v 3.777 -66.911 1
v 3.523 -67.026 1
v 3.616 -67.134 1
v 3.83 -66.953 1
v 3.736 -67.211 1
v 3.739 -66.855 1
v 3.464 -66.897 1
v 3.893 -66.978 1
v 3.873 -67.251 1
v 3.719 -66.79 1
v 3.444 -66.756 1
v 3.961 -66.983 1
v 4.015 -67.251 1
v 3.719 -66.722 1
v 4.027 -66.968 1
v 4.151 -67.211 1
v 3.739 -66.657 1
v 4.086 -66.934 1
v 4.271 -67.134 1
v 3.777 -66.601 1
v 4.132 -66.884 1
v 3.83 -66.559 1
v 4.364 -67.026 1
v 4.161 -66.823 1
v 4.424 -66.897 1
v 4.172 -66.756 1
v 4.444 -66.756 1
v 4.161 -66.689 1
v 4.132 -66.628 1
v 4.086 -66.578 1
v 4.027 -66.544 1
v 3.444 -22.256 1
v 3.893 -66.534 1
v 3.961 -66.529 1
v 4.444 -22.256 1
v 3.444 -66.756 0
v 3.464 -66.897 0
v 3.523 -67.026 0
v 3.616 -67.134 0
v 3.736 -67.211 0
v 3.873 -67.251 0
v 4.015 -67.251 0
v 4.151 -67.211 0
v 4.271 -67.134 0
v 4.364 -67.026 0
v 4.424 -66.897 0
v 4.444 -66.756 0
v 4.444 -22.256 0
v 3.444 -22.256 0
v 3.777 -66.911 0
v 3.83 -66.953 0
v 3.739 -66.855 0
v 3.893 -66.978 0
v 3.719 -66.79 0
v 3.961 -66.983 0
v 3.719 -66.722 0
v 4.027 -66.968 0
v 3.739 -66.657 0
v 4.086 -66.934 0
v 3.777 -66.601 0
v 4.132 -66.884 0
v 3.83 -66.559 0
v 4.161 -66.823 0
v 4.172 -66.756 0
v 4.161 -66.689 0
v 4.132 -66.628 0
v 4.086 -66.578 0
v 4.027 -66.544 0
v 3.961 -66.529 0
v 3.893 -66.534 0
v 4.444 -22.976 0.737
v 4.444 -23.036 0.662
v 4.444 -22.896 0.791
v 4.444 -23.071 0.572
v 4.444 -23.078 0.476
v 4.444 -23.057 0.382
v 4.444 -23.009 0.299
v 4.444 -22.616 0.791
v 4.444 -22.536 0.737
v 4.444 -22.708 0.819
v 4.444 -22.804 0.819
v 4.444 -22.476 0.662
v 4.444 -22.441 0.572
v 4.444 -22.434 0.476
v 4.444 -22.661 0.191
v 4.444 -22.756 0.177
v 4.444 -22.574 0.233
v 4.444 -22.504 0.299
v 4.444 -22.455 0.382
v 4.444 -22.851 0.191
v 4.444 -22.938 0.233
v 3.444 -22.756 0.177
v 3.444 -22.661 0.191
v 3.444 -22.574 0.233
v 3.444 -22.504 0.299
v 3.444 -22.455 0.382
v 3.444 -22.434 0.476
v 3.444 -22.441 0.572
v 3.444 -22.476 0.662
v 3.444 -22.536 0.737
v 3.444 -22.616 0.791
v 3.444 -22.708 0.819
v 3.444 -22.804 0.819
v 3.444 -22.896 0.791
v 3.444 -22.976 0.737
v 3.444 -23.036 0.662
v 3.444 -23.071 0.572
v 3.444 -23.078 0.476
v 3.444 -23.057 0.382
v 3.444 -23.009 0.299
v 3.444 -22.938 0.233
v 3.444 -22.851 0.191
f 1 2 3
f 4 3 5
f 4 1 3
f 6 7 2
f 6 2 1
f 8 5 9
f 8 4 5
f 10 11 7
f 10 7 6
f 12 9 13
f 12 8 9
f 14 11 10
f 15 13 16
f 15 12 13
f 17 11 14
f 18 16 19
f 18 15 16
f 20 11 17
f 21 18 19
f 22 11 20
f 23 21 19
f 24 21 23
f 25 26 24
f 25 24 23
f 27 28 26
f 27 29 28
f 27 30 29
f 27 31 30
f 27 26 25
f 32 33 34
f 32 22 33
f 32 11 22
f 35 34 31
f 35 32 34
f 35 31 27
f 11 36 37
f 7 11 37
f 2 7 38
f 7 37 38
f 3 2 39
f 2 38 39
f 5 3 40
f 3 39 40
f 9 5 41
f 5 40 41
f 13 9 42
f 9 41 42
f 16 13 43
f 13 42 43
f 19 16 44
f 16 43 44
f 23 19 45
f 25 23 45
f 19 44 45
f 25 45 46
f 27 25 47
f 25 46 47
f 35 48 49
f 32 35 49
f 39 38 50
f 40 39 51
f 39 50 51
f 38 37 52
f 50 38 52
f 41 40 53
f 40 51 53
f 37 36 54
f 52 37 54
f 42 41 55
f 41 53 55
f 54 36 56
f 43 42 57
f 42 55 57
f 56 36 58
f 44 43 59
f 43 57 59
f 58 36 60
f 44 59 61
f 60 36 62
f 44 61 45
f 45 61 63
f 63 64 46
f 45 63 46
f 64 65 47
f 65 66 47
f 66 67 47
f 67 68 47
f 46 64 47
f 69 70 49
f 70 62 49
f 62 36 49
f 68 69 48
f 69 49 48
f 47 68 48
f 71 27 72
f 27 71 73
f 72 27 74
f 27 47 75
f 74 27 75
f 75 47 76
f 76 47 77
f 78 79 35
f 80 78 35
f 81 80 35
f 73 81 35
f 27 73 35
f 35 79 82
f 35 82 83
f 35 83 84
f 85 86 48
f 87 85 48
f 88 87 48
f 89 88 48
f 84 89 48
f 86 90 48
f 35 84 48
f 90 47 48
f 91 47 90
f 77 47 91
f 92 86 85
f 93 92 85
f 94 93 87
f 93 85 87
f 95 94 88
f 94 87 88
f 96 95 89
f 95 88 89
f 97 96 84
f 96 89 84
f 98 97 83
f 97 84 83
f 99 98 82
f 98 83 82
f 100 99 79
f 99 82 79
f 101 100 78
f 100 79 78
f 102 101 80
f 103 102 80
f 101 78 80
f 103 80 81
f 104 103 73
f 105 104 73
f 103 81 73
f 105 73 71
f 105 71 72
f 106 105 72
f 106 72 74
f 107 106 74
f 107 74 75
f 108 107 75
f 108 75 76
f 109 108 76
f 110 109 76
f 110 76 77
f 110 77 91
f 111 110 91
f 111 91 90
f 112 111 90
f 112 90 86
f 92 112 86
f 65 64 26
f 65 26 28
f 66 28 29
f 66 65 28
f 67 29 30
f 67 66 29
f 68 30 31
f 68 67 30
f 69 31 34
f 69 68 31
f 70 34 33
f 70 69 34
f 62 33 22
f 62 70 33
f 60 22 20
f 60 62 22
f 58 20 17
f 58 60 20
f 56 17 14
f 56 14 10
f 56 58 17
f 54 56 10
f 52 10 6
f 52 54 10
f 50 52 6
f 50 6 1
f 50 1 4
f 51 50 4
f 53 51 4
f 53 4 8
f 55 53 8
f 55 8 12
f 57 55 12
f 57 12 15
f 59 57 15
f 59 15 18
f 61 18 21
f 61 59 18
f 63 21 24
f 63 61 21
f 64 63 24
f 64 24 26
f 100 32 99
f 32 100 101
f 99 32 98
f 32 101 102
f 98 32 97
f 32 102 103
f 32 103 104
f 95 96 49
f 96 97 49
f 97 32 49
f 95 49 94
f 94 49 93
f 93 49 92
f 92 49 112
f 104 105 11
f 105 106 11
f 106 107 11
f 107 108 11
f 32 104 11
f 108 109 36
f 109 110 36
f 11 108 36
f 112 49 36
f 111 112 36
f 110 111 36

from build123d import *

# Parameters (mm, degrees)
SKETCH1_R           = 0.227761077
BOSS_EXTRUDE1_DEPTH = 1
SKETCH2_R           = 0.323069994
CUT_EXTRUDE1_DEPTH  = 2


with BuildPart() as part:
    # Sketch1 → Boss-Extrude1 (new body)
    with BuildSketch(Plane.XY):
        with BuildLine():
            Line((3.443773372, -22.256132879), (3.443773372, -66.7561317))
            ThreePointArc((3.443773372, -66.7561317), (3.943772783, -67.256132289), (4.443773372, -66.756132879))
            Line((4.443773372, -66.756132879), (4.443773372, -22.256132879))
            Line((4.443773372, -22.256132879), (3.443773372, -22.256132879))
        make_face()
        with Locations((3.943773372, -66.756132289)):
            Circle(SKETCH1_R, mode=Mode.SUBTRACT)
    extrude(amount=BOSS_EXTRUDE1_DEPTH)

    # Sketch2 → Cut-Extrude1 (cut, through all)
    with BuildSketch(Plane(origin=(4.443773372, 0, 0), x_dir=(0, 0, -1), z_dir=(1, 0, 0))):
        with Locations((-0.5, -22.756132879)):
            Circle(SKETCH2_R)
    extrude(amount=-CUT_EXTRUDE1_DEPTH, mode=Mode.SUBTRACT)


solid = part.part
